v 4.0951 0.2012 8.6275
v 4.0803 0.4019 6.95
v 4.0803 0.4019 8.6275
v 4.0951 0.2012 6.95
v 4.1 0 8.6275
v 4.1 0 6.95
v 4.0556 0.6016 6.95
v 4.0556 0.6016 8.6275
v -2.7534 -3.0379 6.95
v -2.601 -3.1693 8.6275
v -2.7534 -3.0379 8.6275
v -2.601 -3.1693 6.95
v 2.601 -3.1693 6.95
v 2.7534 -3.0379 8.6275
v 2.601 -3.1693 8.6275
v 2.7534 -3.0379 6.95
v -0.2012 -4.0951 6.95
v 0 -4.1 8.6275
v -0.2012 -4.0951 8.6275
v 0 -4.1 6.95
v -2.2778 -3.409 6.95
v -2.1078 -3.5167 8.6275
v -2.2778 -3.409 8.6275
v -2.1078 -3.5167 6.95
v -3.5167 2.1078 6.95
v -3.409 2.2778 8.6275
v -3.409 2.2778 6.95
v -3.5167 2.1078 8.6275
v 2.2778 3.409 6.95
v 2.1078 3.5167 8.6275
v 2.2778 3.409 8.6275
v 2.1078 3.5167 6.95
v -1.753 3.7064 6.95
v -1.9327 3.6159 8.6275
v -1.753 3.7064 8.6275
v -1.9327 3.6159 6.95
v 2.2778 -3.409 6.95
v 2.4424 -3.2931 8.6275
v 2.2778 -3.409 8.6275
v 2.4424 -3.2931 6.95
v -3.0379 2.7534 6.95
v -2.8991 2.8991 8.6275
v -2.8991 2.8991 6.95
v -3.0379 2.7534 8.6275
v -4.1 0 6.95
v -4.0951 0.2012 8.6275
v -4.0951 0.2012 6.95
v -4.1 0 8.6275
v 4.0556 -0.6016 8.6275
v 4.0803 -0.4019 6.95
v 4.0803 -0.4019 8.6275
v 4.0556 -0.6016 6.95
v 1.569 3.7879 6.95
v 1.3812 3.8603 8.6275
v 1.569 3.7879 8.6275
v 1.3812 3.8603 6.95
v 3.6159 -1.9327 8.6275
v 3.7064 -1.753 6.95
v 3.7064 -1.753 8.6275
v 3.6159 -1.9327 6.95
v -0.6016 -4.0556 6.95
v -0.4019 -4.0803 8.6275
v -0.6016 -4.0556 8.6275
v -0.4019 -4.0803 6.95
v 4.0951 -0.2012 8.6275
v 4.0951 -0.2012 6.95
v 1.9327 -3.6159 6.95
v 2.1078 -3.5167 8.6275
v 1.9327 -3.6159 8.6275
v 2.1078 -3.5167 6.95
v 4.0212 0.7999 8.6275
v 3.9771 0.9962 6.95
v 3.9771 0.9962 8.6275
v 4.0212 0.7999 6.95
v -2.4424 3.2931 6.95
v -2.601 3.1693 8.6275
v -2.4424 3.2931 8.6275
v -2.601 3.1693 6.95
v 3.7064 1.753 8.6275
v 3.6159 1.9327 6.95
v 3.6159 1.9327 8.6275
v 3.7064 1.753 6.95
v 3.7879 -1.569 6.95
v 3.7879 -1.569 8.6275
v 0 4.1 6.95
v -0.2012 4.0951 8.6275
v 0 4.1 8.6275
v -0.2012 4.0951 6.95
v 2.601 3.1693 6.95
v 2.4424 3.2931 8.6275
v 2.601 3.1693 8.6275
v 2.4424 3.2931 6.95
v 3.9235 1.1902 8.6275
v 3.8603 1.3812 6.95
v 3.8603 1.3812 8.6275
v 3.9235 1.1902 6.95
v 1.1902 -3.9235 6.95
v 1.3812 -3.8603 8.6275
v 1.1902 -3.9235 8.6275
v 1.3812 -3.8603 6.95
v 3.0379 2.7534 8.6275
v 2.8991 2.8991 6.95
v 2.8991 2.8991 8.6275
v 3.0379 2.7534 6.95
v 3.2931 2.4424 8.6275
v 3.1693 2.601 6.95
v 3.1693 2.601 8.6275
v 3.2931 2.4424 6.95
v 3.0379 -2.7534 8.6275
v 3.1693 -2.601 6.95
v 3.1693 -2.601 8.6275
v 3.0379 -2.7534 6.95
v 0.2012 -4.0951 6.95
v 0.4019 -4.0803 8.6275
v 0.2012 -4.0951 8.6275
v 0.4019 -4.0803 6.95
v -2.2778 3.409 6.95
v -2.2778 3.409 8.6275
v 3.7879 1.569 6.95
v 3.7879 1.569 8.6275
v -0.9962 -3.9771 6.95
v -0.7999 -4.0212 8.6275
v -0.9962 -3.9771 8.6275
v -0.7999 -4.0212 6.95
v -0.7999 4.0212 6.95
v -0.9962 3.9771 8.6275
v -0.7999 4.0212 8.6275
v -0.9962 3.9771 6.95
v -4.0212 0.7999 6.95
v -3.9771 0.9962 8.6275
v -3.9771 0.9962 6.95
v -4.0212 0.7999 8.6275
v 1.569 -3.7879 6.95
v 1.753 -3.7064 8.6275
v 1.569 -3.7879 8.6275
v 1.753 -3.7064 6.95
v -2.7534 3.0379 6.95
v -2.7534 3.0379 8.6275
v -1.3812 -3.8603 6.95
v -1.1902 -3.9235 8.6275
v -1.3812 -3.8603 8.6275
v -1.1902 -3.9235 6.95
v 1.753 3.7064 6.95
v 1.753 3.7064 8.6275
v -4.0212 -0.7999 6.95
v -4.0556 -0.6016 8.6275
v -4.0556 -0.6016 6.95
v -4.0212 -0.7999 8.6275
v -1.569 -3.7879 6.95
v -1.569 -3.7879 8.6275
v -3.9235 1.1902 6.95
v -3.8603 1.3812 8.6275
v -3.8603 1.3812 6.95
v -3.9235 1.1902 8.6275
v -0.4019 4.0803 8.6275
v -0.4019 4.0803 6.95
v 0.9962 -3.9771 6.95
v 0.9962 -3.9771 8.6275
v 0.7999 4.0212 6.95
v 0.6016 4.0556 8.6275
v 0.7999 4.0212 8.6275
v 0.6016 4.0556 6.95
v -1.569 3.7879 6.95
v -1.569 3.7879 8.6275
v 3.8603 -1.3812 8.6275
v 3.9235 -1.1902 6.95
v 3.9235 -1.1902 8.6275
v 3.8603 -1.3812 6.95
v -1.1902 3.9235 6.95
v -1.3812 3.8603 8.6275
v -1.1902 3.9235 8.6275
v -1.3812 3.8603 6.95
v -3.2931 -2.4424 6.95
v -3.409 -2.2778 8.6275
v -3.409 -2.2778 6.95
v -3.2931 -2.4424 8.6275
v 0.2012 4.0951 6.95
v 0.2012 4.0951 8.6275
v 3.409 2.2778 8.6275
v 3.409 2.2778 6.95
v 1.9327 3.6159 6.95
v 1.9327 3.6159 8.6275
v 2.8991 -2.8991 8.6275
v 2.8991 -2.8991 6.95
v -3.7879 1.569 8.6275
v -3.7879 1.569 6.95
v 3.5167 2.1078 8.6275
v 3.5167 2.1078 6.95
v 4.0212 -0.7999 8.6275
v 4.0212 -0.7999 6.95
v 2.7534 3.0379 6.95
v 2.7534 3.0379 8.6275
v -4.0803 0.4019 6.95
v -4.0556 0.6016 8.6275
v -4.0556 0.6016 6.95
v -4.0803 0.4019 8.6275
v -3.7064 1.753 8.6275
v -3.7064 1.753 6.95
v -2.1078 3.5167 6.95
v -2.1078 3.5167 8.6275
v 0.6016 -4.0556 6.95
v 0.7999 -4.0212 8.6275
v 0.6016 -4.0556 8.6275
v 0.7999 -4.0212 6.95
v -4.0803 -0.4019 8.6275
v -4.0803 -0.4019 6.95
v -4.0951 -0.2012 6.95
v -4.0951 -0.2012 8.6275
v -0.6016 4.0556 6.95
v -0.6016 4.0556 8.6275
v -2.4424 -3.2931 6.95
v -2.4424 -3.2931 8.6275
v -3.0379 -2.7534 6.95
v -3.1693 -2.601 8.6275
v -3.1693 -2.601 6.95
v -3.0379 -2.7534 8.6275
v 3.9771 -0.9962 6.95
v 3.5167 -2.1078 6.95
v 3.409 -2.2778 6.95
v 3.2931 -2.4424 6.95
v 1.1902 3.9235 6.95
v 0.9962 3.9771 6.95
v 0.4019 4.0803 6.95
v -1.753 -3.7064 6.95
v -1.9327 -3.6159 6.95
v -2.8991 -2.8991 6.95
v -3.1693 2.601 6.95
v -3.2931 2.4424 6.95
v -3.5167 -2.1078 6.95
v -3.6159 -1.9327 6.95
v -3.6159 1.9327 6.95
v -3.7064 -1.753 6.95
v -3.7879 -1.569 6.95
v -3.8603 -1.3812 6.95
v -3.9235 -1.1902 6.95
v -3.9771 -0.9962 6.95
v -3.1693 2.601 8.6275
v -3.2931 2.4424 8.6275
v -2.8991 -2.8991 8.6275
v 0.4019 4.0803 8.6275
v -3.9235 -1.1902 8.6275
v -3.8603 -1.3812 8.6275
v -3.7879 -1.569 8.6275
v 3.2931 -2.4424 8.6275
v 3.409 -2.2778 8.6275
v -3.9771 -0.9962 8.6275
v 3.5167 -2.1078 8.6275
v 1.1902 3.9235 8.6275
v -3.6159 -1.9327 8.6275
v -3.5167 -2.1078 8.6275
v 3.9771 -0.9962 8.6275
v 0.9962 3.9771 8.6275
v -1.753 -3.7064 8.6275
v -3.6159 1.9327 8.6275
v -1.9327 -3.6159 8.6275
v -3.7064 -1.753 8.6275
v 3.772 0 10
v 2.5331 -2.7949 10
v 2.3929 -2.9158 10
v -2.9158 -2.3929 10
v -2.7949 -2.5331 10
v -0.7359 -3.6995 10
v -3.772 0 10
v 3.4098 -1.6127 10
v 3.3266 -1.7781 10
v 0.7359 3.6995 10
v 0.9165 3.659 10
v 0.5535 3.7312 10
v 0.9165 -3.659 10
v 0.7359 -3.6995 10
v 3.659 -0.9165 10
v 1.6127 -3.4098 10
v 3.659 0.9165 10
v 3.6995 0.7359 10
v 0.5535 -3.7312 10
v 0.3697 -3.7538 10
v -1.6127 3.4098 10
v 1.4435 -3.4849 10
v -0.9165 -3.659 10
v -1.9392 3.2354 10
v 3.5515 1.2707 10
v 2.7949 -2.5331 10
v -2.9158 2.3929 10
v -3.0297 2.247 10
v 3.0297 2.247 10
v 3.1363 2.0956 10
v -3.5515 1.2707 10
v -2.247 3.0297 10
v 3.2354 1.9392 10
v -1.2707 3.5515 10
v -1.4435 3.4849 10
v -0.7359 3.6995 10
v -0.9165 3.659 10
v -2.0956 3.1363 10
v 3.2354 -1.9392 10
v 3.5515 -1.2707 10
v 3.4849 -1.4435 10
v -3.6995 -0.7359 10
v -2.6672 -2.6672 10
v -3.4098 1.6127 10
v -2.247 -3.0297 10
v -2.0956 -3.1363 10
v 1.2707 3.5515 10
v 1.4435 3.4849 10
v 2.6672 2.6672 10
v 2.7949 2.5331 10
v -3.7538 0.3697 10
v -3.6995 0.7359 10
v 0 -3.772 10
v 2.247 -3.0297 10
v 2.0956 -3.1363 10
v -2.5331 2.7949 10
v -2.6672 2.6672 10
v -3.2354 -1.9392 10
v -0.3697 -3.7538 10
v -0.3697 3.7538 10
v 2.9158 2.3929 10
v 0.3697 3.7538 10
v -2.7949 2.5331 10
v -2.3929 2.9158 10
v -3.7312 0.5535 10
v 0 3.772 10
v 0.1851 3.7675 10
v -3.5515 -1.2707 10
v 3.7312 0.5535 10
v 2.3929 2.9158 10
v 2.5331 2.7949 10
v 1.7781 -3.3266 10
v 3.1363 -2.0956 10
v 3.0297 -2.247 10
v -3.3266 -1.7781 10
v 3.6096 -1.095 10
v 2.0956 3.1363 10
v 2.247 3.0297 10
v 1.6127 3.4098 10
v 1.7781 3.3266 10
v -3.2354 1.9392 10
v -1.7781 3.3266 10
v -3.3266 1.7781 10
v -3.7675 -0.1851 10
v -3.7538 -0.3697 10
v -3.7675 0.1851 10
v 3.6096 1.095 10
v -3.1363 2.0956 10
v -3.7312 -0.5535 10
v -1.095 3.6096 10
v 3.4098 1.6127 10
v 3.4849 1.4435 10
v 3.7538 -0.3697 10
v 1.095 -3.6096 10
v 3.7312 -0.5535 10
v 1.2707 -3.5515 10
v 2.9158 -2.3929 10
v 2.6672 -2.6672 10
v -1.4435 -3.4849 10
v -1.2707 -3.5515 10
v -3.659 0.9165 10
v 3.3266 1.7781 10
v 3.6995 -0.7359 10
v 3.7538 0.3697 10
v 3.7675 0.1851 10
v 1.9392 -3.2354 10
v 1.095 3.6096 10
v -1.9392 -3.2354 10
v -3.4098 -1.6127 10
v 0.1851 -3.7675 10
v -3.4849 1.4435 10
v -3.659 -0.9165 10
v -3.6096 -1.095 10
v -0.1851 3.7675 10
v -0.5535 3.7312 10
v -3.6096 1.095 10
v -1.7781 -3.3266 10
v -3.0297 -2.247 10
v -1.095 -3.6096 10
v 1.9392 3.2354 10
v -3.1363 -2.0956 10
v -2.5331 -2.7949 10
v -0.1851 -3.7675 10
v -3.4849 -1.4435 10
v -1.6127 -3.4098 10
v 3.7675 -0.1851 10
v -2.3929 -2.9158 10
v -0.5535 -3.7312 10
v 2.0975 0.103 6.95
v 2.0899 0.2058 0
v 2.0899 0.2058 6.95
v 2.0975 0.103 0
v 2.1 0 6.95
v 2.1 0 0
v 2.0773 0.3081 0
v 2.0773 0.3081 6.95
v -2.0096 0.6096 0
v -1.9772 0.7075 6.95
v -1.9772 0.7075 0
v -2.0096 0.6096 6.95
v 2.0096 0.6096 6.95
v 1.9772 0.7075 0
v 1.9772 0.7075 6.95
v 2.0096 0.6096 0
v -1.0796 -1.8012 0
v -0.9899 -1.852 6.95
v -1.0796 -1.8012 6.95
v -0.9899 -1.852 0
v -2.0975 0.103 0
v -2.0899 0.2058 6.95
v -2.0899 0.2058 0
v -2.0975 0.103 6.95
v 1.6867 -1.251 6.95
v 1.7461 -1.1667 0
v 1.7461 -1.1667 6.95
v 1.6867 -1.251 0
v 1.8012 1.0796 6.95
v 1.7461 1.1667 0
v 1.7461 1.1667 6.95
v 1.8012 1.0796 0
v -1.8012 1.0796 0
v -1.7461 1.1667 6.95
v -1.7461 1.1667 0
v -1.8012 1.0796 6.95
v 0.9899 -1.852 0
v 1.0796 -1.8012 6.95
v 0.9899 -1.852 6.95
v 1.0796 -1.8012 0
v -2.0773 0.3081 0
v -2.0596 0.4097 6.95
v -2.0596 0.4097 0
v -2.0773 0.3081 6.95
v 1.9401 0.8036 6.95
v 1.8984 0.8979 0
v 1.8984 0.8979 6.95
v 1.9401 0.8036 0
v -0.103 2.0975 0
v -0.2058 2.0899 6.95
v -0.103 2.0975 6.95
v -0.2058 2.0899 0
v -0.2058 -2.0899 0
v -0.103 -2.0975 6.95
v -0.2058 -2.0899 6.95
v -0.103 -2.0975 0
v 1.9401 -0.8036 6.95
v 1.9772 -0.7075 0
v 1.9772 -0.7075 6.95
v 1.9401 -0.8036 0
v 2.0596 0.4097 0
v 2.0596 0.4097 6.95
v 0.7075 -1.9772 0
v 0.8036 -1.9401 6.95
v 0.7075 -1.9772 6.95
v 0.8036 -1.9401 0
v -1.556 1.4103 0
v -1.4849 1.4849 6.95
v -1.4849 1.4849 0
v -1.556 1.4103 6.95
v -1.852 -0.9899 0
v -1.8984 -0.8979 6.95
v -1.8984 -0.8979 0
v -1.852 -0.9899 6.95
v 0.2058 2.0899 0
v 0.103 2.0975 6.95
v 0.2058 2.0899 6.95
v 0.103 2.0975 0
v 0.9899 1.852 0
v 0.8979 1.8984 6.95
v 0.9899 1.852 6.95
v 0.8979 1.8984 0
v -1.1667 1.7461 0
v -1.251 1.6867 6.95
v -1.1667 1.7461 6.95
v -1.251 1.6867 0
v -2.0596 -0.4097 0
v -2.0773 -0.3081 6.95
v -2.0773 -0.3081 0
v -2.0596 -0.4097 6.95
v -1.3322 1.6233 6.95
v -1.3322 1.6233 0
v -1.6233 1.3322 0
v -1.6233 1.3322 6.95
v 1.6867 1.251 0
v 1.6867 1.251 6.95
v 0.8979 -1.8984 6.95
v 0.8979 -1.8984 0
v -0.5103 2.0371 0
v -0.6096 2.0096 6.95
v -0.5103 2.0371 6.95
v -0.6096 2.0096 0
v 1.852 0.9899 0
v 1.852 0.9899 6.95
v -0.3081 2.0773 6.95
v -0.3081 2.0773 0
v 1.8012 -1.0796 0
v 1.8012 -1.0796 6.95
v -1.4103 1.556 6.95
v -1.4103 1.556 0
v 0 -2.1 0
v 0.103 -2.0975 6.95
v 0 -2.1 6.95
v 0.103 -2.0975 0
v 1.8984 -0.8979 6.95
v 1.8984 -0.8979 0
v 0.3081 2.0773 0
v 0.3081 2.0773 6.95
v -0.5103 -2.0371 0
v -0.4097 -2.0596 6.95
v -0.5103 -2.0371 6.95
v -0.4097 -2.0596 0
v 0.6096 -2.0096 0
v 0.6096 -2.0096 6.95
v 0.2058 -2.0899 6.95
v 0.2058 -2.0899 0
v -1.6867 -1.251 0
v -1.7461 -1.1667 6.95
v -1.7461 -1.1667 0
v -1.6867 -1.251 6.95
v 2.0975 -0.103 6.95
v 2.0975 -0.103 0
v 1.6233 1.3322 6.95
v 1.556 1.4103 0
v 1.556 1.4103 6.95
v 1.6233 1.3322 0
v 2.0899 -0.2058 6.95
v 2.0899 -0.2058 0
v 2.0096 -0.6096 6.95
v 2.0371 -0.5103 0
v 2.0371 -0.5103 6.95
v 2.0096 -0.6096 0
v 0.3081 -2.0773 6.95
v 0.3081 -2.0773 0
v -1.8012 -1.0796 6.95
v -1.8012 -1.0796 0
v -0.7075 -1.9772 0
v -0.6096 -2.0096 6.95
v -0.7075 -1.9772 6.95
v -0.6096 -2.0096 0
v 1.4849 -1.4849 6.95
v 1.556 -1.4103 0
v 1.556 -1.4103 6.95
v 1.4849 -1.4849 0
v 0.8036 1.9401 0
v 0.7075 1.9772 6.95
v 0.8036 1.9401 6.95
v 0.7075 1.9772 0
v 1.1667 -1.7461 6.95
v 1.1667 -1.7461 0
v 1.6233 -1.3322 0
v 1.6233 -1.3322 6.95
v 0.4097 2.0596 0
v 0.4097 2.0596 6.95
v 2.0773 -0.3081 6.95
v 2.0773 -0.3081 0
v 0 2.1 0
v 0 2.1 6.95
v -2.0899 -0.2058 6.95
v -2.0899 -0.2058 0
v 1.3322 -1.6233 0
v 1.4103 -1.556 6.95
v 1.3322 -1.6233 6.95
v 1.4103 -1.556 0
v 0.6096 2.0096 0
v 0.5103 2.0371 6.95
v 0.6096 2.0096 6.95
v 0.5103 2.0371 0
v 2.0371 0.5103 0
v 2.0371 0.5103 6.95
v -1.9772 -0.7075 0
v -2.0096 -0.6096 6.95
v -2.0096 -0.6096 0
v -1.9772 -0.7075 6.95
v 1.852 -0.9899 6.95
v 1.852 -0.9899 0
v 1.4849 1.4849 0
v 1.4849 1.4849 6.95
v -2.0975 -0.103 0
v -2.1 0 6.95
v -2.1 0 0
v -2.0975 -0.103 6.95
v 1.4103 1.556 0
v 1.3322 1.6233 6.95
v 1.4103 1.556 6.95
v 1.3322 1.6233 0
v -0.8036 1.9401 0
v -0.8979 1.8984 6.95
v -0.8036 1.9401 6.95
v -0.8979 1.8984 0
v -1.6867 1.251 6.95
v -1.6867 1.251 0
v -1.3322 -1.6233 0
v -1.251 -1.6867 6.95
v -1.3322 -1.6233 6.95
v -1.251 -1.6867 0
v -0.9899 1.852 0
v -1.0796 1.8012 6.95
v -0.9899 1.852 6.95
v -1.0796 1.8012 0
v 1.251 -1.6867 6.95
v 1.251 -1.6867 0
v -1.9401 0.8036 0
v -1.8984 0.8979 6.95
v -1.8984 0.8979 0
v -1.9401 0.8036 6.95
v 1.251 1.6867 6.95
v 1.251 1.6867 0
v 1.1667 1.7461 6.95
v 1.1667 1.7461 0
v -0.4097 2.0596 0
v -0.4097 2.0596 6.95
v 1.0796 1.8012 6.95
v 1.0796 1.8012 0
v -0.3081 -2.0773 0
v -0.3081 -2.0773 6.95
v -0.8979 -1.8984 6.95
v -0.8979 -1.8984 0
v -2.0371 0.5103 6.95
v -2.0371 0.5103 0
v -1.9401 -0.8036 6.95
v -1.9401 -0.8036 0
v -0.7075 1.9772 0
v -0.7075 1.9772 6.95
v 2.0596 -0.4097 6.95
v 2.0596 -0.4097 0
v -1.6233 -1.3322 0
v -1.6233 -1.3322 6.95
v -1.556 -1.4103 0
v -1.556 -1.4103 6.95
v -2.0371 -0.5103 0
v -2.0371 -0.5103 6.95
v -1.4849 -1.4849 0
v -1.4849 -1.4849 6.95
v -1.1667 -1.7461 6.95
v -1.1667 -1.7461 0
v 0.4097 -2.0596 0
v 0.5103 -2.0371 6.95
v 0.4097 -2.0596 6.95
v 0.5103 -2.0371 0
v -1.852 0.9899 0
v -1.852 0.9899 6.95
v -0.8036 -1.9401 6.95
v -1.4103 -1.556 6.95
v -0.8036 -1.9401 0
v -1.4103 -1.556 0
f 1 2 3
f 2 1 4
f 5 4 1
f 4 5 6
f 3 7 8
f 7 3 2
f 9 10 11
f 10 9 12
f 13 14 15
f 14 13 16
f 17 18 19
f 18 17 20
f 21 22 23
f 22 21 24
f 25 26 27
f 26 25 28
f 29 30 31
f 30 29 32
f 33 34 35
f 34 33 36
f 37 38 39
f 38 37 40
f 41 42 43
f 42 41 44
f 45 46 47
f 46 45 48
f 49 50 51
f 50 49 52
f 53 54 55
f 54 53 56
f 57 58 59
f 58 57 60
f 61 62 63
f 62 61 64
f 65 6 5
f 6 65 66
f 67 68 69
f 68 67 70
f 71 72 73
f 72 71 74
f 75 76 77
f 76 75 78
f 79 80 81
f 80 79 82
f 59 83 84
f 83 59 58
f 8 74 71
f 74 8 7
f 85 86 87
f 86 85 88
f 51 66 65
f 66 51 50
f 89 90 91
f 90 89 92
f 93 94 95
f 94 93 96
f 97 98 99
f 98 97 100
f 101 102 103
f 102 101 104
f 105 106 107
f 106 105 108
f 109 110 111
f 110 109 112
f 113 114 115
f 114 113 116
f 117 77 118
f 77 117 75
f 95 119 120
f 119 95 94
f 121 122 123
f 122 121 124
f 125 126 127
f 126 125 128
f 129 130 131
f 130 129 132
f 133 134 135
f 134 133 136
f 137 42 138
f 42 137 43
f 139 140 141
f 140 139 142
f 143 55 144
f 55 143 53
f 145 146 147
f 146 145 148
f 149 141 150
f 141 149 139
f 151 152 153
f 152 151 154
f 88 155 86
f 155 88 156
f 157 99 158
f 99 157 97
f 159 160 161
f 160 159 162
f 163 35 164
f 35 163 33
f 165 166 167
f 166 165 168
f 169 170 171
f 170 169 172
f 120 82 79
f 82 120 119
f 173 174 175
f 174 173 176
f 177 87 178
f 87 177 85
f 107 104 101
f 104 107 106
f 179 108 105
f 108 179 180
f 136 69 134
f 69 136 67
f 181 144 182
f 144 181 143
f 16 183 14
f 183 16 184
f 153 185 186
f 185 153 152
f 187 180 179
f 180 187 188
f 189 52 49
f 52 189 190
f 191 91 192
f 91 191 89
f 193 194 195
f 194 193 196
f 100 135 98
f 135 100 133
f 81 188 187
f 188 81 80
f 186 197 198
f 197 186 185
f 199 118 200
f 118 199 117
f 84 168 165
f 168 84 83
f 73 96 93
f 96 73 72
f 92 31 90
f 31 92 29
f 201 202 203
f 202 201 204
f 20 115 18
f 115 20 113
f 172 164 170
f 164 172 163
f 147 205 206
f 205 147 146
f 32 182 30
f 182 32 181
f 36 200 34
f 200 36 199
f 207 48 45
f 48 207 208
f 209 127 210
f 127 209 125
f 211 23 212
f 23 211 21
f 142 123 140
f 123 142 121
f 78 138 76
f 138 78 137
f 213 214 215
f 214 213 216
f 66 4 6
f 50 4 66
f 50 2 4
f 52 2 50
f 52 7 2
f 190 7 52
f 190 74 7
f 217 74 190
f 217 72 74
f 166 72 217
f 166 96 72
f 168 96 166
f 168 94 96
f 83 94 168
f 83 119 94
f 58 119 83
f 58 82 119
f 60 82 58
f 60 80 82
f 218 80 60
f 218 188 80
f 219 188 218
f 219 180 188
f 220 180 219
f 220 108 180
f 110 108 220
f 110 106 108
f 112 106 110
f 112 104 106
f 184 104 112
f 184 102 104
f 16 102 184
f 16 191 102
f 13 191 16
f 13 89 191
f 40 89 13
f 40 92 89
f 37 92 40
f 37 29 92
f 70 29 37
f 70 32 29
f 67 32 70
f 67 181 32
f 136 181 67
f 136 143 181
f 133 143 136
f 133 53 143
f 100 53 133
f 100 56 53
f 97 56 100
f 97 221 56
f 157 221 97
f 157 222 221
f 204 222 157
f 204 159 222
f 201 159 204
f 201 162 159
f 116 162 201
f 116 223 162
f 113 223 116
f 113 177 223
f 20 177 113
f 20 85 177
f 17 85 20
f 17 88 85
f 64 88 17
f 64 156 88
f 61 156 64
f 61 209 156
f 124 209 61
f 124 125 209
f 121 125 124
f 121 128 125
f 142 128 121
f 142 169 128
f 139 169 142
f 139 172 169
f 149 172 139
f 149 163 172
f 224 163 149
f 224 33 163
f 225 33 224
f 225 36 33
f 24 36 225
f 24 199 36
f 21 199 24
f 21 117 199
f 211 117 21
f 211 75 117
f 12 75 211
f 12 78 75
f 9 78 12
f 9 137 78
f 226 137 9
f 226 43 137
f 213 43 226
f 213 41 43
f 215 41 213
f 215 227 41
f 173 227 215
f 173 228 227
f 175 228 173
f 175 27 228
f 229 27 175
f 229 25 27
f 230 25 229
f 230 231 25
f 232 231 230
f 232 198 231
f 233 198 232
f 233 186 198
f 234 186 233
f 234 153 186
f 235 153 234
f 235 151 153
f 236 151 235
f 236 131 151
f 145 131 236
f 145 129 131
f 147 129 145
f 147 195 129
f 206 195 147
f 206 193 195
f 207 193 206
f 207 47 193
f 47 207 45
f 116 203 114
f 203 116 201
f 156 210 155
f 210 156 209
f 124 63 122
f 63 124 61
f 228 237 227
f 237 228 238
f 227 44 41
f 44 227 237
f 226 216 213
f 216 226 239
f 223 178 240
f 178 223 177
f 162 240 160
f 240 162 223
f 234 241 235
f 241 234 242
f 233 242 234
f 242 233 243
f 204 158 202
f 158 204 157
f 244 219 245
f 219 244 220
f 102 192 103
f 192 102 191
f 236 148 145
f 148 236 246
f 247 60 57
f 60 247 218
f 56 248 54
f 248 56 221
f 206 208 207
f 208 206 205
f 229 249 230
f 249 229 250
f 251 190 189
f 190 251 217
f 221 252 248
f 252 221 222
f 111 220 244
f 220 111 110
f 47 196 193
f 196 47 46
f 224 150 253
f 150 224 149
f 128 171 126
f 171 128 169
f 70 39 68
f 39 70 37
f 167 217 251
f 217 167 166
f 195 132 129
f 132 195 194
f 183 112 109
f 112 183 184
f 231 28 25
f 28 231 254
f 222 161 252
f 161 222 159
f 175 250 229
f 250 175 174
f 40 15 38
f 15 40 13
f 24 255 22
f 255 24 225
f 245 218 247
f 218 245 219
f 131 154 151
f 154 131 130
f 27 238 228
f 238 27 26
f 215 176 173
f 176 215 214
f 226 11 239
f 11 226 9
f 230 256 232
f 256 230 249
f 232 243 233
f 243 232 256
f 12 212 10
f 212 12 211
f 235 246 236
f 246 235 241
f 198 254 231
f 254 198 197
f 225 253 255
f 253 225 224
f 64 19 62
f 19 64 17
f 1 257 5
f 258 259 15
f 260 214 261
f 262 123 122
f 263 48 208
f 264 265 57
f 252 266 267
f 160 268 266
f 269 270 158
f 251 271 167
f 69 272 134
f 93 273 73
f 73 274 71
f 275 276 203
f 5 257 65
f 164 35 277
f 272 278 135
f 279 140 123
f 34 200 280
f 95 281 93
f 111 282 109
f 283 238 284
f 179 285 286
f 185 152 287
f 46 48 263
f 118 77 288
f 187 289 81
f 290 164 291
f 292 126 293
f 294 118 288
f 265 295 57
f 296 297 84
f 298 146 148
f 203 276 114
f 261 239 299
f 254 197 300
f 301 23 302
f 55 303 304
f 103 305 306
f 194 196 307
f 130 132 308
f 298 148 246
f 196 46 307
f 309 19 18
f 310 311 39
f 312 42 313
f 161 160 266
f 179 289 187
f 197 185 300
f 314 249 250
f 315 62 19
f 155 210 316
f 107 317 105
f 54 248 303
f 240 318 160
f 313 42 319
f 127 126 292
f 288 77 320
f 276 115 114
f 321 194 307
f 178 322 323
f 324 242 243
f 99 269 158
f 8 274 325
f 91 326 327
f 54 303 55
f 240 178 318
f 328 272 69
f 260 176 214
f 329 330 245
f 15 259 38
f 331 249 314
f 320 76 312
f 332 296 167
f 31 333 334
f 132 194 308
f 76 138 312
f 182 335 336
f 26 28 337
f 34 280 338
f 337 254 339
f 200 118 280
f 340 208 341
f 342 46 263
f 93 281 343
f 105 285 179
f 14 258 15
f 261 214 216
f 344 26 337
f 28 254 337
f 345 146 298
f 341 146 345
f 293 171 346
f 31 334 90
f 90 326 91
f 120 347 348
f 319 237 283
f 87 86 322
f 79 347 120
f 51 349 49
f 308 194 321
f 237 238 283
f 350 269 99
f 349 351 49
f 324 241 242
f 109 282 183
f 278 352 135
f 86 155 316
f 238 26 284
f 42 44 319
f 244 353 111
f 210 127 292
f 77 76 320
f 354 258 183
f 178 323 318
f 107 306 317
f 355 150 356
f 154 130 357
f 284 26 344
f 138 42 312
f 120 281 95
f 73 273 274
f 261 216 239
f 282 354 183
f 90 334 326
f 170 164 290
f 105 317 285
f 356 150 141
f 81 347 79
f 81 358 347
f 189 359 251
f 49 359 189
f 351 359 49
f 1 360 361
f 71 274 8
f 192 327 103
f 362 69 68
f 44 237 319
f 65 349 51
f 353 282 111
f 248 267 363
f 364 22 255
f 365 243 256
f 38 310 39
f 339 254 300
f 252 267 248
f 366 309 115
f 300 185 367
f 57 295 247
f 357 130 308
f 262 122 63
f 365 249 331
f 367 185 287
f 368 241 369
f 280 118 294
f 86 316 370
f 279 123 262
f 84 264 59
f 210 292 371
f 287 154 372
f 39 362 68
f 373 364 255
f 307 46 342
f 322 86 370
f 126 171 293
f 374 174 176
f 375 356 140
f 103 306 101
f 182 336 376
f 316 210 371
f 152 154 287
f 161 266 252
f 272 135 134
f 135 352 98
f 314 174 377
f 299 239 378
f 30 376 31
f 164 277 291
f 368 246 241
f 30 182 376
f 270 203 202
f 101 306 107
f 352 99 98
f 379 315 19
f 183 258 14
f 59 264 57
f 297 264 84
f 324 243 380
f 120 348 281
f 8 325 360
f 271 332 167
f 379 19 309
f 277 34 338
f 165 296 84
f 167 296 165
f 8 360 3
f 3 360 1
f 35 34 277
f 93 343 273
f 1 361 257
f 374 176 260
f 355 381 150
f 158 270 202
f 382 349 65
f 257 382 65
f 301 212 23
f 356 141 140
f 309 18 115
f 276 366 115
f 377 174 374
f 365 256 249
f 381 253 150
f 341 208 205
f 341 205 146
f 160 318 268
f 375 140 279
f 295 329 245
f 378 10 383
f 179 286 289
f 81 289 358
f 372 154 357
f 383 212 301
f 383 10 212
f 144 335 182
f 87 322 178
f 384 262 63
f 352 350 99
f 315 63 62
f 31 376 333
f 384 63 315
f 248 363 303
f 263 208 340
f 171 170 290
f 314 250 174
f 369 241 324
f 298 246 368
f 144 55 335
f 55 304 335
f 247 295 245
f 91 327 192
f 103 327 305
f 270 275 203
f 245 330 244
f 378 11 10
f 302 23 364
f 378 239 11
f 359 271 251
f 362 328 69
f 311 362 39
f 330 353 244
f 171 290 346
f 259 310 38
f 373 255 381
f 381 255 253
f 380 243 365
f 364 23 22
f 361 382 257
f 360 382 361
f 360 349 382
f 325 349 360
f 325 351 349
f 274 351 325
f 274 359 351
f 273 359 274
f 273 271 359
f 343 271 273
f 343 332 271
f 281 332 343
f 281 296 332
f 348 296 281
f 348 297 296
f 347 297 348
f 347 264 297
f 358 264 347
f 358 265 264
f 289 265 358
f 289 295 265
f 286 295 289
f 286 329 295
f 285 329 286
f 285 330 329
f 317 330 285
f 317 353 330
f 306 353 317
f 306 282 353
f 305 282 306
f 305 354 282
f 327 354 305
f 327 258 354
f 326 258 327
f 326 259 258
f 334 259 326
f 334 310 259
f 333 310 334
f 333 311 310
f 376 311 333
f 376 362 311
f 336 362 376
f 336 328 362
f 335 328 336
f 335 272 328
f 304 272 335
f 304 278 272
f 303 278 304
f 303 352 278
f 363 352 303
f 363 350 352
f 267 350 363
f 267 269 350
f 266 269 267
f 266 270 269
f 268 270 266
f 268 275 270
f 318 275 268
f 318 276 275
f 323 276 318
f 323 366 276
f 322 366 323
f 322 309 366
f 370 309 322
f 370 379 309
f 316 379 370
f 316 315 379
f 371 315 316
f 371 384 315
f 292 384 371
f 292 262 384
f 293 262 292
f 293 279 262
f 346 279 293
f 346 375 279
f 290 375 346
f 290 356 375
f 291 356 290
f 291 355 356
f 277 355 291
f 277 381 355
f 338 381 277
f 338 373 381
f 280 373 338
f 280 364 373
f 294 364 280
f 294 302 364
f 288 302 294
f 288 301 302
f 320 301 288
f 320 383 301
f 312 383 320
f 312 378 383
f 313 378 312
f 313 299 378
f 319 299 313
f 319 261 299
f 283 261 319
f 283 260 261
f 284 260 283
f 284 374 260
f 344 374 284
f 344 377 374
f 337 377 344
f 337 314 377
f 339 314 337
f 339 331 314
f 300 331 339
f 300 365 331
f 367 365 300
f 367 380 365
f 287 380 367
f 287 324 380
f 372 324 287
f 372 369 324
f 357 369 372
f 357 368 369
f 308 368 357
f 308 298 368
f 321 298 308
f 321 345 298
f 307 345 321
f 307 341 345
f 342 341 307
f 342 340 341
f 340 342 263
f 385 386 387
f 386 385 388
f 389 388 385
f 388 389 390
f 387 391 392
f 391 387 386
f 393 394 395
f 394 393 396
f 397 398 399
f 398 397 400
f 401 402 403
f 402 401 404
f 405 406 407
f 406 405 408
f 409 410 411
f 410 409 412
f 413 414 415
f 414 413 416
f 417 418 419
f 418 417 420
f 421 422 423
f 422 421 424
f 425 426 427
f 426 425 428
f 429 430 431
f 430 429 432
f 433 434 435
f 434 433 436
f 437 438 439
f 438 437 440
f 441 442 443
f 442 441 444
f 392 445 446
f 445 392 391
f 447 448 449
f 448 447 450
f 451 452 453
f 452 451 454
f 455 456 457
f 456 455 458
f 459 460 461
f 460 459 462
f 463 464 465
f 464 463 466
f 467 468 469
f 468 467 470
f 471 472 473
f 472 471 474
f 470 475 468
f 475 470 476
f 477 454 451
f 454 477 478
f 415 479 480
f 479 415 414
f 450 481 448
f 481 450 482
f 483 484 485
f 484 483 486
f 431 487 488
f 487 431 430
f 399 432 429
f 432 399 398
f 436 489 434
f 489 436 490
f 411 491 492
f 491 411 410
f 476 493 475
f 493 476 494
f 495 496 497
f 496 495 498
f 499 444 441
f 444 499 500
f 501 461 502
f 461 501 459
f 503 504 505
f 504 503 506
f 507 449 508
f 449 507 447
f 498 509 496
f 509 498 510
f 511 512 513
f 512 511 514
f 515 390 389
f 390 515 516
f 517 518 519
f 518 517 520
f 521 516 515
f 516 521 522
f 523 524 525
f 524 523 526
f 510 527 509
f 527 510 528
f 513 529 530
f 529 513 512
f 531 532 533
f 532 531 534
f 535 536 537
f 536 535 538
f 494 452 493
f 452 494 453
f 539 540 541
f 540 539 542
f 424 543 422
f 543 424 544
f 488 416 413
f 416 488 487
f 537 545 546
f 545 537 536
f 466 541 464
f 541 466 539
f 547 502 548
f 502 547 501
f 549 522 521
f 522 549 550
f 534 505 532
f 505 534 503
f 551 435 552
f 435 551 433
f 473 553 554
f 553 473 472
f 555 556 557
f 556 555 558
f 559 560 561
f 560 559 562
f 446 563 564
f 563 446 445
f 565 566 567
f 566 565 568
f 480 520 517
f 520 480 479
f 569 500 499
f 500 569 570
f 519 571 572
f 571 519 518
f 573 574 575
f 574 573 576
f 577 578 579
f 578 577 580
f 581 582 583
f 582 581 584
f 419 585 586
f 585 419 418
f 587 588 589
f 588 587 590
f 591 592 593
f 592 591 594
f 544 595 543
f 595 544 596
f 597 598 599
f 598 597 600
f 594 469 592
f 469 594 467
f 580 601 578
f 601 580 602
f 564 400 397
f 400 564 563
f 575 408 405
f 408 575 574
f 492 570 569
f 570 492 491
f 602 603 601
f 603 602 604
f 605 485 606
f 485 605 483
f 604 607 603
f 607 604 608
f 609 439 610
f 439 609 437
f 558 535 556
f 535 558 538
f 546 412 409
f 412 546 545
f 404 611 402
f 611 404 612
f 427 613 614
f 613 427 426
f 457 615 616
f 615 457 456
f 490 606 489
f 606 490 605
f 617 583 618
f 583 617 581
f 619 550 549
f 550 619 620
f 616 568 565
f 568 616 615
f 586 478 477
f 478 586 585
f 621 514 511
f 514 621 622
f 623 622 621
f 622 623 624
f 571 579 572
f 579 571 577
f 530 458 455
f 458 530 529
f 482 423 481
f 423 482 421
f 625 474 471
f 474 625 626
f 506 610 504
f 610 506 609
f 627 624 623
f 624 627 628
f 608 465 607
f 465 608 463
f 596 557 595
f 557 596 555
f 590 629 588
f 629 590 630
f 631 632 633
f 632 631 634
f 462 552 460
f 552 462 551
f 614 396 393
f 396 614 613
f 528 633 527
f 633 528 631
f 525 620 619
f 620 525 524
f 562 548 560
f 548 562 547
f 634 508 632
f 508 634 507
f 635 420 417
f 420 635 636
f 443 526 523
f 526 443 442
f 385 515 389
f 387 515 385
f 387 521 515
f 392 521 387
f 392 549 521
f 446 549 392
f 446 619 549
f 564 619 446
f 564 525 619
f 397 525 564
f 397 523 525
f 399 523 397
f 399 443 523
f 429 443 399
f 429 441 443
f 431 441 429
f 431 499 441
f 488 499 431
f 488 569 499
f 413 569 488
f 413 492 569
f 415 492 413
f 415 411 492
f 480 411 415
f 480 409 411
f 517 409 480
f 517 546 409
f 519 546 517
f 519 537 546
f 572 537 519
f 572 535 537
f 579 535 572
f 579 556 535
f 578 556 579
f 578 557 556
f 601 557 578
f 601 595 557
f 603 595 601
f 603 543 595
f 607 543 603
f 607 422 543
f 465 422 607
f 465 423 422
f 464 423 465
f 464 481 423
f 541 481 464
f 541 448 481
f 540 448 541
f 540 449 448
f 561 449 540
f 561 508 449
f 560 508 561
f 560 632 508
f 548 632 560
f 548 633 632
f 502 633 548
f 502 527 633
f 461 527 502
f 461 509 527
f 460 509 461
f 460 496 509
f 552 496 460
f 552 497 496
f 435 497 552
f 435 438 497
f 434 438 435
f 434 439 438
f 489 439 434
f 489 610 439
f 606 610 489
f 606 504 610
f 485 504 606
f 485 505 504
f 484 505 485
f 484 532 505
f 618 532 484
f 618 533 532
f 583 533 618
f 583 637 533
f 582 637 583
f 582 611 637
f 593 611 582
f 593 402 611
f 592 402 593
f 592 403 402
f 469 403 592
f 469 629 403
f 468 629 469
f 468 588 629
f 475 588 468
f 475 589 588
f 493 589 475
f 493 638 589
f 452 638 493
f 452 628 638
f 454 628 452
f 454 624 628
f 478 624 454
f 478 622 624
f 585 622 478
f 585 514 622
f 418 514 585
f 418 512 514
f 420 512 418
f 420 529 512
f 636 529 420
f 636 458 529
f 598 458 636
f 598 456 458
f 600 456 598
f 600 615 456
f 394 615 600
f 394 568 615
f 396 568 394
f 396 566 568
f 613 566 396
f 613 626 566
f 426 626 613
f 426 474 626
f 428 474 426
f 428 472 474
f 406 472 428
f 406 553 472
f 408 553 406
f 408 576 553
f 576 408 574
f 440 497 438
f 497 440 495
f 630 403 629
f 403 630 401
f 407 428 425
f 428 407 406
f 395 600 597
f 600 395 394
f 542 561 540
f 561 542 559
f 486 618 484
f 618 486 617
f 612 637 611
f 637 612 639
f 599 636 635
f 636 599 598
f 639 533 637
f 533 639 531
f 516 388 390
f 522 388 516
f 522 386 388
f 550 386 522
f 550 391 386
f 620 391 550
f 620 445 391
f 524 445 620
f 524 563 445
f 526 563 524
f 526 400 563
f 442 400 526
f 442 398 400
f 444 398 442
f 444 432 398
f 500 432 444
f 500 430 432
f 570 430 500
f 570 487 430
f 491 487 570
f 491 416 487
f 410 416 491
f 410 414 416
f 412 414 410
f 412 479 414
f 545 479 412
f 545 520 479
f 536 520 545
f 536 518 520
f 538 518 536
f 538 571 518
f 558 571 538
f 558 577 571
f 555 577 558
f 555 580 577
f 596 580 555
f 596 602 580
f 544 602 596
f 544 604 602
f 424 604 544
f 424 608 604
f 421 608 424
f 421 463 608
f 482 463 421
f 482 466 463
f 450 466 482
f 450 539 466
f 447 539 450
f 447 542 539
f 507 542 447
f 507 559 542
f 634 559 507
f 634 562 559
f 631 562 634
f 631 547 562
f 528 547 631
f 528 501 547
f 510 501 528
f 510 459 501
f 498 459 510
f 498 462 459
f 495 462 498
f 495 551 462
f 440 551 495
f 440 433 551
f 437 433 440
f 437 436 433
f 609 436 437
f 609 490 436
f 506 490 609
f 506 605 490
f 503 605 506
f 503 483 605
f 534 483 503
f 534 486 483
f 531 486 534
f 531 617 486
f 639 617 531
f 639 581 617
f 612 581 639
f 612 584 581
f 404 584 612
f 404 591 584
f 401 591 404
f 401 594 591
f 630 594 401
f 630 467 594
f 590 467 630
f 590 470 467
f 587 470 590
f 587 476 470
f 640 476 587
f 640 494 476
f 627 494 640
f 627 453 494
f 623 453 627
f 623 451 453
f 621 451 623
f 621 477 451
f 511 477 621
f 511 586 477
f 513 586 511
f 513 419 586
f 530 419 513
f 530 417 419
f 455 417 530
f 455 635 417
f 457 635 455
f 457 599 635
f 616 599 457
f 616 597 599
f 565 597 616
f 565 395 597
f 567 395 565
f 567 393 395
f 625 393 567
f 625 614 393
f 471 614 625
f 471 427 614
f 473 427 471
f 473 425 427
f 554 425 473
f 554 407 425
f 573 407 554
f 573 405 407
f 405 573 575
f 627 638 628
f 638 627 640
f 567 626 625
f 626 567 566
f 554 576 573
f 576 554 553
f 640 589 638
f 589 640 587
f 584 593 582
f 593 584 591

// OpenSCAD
$fn = 128;

// Pan head screw (simplified, no threads)
// Dimensions from description:
d_shank = 4.2;      // mm
L = 10;             // mm (overall length)
d_head = 8.2;       // mm
h_head = 3.05;      // mm

// Simple pan head profile parameters (approximation)
h_cyl = h_head * 0.55;          // cylindrical portion of head
h_dome = h_head - h_cyl;        // domed portion
d_top = d_head * 0.92;          // slightly smaller top diameter for dome

module pan_head_screw() {
    union() {
        // Shank
        cylinder(d = d_shank, h = L - h_head);

        // Head (placed on top of shank)
        translate([0,0,L - h_head]) {
            union() {
                // Cylindrical base of head
                cylinder(d = d_head, h = h_cyl);

                // Domed top (frustum to a smaller top diameter)
                translate([0,0,h_cyl])
                    cylinder(d1 = d_head, d2 = d_top, h = h_dome);
            }
        }
    }
}

pan_head_screw();
